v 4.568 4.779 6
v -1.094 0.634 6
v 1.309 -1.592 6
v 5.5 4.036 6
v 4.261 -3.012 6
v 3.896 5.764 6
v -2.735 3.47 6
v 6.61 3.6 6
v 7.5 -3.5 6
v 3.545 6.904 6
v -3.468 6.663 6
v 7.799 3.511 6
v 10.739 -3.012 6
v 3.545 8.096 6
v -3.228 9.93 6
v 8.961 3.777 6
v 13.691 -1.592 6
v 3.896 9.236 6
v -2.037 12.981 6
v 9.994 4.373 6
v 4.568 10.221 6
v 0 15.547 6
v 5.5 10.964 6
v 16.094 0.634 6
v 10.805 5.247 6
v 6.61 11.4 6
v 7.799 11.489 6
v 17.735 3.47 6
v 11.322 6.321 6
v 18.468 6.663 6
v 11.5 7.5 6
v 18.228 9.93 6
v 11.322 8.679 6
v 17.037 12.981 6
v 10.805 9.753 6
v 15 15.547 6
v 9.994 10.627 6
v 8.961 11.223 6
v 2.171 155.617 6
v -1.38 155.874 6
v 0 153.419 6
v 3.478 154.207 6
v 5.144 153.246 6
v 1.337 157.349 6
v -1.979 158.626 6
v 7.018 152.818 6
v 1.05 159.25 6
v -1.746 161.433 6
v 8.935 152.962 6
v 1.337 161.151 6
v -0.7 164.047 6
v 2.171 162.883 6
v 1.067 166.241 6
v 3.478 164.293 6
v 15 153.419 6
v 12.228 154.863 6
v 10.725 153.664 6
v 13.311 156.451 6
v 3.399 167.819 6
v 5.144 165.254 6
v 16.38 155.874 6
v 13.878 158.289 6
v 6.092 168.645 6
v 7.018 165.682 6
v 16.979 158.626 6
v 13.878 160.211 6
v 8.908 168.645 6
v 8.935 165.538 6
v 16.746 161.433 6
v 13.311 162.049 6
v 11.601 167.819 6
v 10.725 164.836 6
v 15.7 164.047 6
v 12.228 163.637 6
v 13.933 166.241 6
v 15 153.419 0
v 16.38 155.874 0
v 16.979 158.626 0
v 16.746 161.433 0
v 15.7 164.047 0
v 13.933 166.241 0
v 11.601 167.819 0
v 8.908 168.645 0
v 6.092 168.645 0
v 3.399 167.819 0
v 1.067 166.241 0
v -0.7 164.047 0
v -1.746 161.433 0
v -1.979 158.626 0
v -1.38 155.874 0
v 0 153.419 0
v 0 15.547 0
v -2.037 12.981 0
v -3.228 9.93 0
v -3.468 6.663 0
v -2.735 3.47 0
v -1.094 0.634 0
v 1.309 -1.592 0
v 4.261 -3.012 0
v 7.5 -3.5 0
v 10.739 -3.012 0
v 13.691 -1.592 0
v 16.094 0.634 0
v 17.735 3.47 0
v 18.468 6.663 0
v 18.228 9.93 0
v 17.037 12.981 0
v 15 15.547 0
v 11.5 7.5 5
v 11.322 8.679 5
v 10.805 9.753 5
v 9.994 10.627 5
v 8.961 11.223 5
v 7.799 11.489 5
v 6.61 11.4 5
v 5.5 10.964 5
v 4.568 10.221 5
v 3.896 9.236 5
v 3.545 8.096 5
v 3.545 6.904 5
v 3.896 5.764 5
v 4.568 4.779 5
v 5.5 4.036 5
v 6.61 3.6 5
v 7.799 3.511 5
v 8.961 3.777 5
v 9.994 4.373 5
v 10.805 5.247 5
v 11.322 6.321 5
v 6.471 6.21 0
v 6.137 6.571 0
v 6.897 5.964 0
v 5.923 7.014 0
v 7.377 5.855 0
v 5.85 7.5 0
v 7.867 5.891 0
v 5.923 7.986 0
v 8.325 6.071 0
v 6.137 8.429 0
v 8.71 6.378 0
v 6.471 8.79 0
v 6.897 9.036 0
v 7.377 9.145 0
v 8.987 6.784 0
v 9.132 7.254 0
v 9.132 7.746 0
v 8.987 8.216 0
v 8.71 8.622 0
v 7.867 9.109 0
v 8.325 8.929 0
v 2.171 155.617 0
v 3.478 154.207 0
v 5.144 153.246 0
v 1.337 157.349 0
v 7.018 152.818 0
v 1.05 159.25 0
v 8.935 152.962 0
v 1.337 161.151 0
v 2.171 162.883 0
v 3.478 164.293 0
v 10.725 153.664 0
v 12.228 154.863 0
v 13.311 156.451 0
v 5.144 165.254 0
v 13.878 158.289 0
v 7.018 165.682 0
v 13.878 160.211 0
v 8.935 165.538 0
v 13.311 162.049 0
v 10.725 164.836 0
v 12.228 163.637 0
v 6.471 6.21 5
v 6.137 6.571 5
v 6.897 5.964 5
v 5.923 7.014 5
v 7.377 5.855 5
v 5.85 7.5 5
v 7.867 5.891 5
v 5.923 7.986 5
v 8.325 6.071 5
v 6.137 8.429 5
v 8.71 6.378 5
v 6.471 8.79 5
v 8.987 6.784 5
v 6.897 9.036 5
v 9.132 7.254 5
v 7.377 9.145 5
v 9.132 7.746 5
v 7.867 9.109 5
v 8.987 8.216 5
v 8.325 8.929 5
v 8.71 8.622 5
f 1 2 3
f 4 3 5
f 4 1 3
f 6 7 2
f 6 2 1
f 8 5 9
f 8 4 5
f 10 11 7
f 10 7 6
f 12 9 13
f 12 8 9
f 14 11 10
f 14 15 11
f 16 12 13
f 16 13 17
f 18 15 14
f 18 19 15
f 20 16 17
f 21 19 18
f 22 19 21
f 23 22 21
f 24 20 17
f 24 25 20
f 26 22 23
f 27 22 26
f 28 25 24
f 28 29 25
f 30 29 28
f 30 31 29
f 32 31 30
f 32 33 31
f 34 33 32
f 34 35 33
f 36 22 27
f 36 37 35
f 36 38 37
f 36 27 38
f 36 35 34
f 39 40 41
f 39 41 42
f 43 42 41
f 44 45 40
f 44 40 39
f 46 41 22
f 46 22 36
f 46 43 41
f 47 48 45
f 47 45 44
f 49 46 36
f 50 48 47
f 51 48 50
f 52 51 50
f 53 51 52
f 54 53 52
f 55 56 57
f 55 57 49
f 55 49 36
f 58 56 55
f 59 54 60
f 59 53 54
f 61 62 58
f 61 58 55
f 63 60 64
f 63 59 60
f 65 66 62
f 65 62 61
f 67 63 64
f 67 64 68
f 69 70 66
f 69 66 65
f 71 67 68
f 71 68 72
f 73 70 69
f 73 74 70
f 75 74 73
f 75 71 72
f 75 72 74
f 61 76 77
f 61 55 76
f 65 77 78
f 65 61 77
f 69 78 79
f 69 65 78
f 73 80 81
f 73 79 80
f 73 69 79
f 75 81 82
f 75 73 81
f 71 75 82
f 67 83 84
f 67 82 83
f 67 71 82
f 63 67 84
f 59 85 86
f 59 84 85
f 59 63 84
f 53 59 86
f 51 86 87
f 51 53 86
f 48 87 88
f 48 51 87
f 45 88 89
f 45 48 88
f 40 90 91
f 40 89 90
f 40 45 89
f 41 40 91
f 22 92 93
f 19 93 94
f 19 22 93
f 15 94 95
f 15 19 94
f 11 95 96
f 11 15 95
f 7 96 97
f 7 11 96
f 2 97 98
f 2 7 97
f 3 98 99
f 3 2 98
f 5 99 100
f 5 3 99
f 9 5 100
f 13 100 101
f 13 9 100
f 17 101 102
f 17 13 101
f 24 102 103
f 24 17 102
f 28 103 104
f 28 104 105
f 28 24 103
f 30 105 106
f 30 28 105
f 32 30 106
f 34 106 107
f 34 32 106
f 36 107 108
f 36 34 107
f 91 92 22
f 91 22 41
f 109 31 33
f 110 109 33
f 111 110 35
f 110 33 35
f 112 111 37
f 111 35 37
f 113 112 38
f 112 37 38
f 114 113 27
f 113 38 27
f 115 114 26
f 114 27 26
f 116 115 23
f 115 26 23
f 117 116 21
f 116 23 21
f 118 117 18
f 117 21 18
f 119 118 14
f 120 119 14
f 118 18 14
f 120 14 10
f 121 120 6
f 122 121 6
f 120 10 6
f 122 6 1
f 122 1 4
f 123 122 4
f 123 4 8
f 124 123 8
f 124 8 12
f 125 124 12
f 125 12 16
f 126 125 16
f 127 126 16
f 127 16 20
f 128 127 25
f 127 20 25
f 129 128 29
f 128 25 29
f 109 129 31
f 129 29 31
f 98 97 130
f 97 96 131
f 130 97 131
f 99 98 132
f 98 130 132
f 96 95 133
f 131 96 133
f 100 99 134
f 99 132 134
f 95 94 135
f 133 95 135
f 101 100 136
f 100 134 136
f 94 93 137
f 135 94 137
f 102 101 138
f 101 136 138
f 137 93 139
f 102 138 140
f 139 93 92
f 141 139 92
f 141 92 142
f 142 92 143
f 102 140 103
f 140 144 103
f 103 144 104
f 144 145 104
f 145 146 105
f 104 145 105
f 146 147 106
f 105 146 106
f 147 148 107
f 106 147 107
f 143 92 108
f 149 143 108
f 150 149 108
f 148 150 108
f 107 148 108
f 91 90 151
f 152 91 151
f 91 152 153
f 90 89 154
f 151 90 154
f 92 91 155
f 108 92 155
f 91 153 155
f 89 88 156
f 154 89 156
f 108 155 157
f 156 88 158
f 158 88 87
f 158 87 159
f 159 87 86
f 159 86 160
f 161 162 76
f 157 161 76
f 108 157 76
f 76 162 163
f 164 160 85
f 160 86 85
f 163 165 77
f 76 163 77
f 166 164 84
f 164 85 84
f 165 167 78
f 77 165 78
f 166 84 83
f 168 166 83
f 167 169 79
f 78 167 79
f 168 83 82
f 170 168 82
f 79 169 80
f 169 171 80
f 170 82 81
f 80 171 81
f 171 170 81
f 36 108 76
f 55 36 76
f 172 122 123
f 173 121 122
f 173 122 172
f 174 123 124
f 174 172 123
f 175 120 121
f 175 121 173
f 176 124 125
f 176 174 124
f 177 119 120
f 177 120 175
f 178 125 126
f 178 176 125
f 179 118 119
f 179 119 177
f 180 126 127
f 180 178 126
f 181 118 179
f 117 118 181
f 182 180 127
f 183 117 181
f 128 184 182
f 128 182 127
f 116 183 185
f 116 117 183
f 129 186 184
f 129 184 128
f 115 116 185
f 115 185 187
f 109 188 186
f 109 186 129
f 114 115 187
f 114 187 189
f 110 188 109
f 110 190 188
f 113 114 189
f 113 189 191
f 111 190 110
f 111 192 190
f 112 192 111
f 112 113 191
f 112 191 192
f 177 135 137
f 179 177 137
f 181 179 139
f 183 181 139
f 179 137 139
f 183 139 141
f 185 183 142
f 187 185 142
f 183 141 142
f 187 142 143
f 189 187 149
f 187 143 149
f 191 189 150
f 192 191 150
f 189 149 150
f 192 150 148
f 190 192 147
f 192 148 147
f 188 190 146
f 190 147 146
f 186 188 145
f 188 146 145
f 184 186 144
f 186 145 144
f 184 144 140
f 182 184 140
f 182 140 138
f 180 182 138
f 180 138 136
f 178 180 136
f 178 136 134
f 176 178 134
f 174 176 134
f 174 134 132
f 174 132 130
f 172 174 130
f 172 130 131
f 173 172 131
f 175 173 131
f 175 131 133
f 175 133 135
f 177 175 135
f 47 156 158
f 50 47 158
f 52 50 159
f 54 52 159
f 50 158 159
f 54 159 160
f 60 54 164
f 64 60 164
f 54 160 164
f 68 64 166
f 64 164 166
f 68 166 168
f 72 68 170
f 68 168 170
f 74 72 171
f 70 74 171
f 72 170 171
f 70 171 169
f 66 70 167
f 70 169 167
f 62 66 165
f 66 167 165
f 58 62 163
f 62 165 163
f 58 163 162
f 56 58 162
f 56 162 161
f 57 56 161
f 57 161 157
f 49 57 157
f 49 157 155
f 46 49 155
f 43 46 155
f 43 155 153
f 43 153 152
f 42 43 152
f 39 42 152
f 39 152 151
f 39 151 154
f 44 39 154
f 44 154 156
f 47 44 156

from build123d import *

# Parameters (mm, degrees)
ESQUISSE1_W             = 15
ESQUISSE1_H             = 165
BOSS_EXTRU_1_DEPTH      = 6
ESQUISSE2_R             = 11
ESQUISSE2_R_2           = 9.5
BOSS_EXTRU_2_DEPTH      = 6
ESQUISSE3_R             = 1.65
ESQUISSE3_R_2           = 6.45
ENL_V_MAT_EXTRU_1_DEPTH = 10
ESQUISSE4_R             = 4
ENL_V_MAT_EXTRU_2_DEPTH = 1


with BuildPart() as part:
    # Esquisse1 → Boss.-Extru.1 (new body)
    with BuildSketch(Plane.XY):
        with Locations((7.5, 82.5)):
            Rectangle(ESQUISSE1_W, ESQUISSE1_H)
    extrude(amount=BOSS_EXTRU_1_DEPTH)

    # Esquisse2 → Boss.-Extru.2 (add)
    with BuildSketch(Plane.XY.offset(6)):
        with Locations((7.5, 7.5)):
            Circle(ESQUISSE2_R)
        with Locations((7.5, 159.25)):
            Circle(ESQUISSE2_R_2)
    extrude(amount=-BOSS_EXTRU_2_DEPTH)

    # Esquisse3 → Enlèv. mat.-Extru.1 (cut)
    with BuildSketch(Plane(origin=(0, 0, 0), x_dir=(-1, 0, 0), z_dir=(0, 0, -1))):
        with Locations((-7.5, 7.5)):
            Circle(ESQUISSE3_R)
        with Locations((-7.5, 159.25)):
            Circle(ESQUISSE3_R_2)
    extrude(amount=-ENL_V_MAT_EXTRU_1_DEPTH, mode=Mode.SUBTRACT)

    # Esquisse4 → Enlèv. mat.-Extru.2 (cut)
    with BuildSketch(Plane.XY.offset(6)):
        with Locations((7.5, 7.5)):
            Circle(ESQUISSE4_R)
    extrude(amount=-ENL_V_MAT_EXTRU_2_DEPTH, mode=Mode.SUBTRACT)


solid = part.part
